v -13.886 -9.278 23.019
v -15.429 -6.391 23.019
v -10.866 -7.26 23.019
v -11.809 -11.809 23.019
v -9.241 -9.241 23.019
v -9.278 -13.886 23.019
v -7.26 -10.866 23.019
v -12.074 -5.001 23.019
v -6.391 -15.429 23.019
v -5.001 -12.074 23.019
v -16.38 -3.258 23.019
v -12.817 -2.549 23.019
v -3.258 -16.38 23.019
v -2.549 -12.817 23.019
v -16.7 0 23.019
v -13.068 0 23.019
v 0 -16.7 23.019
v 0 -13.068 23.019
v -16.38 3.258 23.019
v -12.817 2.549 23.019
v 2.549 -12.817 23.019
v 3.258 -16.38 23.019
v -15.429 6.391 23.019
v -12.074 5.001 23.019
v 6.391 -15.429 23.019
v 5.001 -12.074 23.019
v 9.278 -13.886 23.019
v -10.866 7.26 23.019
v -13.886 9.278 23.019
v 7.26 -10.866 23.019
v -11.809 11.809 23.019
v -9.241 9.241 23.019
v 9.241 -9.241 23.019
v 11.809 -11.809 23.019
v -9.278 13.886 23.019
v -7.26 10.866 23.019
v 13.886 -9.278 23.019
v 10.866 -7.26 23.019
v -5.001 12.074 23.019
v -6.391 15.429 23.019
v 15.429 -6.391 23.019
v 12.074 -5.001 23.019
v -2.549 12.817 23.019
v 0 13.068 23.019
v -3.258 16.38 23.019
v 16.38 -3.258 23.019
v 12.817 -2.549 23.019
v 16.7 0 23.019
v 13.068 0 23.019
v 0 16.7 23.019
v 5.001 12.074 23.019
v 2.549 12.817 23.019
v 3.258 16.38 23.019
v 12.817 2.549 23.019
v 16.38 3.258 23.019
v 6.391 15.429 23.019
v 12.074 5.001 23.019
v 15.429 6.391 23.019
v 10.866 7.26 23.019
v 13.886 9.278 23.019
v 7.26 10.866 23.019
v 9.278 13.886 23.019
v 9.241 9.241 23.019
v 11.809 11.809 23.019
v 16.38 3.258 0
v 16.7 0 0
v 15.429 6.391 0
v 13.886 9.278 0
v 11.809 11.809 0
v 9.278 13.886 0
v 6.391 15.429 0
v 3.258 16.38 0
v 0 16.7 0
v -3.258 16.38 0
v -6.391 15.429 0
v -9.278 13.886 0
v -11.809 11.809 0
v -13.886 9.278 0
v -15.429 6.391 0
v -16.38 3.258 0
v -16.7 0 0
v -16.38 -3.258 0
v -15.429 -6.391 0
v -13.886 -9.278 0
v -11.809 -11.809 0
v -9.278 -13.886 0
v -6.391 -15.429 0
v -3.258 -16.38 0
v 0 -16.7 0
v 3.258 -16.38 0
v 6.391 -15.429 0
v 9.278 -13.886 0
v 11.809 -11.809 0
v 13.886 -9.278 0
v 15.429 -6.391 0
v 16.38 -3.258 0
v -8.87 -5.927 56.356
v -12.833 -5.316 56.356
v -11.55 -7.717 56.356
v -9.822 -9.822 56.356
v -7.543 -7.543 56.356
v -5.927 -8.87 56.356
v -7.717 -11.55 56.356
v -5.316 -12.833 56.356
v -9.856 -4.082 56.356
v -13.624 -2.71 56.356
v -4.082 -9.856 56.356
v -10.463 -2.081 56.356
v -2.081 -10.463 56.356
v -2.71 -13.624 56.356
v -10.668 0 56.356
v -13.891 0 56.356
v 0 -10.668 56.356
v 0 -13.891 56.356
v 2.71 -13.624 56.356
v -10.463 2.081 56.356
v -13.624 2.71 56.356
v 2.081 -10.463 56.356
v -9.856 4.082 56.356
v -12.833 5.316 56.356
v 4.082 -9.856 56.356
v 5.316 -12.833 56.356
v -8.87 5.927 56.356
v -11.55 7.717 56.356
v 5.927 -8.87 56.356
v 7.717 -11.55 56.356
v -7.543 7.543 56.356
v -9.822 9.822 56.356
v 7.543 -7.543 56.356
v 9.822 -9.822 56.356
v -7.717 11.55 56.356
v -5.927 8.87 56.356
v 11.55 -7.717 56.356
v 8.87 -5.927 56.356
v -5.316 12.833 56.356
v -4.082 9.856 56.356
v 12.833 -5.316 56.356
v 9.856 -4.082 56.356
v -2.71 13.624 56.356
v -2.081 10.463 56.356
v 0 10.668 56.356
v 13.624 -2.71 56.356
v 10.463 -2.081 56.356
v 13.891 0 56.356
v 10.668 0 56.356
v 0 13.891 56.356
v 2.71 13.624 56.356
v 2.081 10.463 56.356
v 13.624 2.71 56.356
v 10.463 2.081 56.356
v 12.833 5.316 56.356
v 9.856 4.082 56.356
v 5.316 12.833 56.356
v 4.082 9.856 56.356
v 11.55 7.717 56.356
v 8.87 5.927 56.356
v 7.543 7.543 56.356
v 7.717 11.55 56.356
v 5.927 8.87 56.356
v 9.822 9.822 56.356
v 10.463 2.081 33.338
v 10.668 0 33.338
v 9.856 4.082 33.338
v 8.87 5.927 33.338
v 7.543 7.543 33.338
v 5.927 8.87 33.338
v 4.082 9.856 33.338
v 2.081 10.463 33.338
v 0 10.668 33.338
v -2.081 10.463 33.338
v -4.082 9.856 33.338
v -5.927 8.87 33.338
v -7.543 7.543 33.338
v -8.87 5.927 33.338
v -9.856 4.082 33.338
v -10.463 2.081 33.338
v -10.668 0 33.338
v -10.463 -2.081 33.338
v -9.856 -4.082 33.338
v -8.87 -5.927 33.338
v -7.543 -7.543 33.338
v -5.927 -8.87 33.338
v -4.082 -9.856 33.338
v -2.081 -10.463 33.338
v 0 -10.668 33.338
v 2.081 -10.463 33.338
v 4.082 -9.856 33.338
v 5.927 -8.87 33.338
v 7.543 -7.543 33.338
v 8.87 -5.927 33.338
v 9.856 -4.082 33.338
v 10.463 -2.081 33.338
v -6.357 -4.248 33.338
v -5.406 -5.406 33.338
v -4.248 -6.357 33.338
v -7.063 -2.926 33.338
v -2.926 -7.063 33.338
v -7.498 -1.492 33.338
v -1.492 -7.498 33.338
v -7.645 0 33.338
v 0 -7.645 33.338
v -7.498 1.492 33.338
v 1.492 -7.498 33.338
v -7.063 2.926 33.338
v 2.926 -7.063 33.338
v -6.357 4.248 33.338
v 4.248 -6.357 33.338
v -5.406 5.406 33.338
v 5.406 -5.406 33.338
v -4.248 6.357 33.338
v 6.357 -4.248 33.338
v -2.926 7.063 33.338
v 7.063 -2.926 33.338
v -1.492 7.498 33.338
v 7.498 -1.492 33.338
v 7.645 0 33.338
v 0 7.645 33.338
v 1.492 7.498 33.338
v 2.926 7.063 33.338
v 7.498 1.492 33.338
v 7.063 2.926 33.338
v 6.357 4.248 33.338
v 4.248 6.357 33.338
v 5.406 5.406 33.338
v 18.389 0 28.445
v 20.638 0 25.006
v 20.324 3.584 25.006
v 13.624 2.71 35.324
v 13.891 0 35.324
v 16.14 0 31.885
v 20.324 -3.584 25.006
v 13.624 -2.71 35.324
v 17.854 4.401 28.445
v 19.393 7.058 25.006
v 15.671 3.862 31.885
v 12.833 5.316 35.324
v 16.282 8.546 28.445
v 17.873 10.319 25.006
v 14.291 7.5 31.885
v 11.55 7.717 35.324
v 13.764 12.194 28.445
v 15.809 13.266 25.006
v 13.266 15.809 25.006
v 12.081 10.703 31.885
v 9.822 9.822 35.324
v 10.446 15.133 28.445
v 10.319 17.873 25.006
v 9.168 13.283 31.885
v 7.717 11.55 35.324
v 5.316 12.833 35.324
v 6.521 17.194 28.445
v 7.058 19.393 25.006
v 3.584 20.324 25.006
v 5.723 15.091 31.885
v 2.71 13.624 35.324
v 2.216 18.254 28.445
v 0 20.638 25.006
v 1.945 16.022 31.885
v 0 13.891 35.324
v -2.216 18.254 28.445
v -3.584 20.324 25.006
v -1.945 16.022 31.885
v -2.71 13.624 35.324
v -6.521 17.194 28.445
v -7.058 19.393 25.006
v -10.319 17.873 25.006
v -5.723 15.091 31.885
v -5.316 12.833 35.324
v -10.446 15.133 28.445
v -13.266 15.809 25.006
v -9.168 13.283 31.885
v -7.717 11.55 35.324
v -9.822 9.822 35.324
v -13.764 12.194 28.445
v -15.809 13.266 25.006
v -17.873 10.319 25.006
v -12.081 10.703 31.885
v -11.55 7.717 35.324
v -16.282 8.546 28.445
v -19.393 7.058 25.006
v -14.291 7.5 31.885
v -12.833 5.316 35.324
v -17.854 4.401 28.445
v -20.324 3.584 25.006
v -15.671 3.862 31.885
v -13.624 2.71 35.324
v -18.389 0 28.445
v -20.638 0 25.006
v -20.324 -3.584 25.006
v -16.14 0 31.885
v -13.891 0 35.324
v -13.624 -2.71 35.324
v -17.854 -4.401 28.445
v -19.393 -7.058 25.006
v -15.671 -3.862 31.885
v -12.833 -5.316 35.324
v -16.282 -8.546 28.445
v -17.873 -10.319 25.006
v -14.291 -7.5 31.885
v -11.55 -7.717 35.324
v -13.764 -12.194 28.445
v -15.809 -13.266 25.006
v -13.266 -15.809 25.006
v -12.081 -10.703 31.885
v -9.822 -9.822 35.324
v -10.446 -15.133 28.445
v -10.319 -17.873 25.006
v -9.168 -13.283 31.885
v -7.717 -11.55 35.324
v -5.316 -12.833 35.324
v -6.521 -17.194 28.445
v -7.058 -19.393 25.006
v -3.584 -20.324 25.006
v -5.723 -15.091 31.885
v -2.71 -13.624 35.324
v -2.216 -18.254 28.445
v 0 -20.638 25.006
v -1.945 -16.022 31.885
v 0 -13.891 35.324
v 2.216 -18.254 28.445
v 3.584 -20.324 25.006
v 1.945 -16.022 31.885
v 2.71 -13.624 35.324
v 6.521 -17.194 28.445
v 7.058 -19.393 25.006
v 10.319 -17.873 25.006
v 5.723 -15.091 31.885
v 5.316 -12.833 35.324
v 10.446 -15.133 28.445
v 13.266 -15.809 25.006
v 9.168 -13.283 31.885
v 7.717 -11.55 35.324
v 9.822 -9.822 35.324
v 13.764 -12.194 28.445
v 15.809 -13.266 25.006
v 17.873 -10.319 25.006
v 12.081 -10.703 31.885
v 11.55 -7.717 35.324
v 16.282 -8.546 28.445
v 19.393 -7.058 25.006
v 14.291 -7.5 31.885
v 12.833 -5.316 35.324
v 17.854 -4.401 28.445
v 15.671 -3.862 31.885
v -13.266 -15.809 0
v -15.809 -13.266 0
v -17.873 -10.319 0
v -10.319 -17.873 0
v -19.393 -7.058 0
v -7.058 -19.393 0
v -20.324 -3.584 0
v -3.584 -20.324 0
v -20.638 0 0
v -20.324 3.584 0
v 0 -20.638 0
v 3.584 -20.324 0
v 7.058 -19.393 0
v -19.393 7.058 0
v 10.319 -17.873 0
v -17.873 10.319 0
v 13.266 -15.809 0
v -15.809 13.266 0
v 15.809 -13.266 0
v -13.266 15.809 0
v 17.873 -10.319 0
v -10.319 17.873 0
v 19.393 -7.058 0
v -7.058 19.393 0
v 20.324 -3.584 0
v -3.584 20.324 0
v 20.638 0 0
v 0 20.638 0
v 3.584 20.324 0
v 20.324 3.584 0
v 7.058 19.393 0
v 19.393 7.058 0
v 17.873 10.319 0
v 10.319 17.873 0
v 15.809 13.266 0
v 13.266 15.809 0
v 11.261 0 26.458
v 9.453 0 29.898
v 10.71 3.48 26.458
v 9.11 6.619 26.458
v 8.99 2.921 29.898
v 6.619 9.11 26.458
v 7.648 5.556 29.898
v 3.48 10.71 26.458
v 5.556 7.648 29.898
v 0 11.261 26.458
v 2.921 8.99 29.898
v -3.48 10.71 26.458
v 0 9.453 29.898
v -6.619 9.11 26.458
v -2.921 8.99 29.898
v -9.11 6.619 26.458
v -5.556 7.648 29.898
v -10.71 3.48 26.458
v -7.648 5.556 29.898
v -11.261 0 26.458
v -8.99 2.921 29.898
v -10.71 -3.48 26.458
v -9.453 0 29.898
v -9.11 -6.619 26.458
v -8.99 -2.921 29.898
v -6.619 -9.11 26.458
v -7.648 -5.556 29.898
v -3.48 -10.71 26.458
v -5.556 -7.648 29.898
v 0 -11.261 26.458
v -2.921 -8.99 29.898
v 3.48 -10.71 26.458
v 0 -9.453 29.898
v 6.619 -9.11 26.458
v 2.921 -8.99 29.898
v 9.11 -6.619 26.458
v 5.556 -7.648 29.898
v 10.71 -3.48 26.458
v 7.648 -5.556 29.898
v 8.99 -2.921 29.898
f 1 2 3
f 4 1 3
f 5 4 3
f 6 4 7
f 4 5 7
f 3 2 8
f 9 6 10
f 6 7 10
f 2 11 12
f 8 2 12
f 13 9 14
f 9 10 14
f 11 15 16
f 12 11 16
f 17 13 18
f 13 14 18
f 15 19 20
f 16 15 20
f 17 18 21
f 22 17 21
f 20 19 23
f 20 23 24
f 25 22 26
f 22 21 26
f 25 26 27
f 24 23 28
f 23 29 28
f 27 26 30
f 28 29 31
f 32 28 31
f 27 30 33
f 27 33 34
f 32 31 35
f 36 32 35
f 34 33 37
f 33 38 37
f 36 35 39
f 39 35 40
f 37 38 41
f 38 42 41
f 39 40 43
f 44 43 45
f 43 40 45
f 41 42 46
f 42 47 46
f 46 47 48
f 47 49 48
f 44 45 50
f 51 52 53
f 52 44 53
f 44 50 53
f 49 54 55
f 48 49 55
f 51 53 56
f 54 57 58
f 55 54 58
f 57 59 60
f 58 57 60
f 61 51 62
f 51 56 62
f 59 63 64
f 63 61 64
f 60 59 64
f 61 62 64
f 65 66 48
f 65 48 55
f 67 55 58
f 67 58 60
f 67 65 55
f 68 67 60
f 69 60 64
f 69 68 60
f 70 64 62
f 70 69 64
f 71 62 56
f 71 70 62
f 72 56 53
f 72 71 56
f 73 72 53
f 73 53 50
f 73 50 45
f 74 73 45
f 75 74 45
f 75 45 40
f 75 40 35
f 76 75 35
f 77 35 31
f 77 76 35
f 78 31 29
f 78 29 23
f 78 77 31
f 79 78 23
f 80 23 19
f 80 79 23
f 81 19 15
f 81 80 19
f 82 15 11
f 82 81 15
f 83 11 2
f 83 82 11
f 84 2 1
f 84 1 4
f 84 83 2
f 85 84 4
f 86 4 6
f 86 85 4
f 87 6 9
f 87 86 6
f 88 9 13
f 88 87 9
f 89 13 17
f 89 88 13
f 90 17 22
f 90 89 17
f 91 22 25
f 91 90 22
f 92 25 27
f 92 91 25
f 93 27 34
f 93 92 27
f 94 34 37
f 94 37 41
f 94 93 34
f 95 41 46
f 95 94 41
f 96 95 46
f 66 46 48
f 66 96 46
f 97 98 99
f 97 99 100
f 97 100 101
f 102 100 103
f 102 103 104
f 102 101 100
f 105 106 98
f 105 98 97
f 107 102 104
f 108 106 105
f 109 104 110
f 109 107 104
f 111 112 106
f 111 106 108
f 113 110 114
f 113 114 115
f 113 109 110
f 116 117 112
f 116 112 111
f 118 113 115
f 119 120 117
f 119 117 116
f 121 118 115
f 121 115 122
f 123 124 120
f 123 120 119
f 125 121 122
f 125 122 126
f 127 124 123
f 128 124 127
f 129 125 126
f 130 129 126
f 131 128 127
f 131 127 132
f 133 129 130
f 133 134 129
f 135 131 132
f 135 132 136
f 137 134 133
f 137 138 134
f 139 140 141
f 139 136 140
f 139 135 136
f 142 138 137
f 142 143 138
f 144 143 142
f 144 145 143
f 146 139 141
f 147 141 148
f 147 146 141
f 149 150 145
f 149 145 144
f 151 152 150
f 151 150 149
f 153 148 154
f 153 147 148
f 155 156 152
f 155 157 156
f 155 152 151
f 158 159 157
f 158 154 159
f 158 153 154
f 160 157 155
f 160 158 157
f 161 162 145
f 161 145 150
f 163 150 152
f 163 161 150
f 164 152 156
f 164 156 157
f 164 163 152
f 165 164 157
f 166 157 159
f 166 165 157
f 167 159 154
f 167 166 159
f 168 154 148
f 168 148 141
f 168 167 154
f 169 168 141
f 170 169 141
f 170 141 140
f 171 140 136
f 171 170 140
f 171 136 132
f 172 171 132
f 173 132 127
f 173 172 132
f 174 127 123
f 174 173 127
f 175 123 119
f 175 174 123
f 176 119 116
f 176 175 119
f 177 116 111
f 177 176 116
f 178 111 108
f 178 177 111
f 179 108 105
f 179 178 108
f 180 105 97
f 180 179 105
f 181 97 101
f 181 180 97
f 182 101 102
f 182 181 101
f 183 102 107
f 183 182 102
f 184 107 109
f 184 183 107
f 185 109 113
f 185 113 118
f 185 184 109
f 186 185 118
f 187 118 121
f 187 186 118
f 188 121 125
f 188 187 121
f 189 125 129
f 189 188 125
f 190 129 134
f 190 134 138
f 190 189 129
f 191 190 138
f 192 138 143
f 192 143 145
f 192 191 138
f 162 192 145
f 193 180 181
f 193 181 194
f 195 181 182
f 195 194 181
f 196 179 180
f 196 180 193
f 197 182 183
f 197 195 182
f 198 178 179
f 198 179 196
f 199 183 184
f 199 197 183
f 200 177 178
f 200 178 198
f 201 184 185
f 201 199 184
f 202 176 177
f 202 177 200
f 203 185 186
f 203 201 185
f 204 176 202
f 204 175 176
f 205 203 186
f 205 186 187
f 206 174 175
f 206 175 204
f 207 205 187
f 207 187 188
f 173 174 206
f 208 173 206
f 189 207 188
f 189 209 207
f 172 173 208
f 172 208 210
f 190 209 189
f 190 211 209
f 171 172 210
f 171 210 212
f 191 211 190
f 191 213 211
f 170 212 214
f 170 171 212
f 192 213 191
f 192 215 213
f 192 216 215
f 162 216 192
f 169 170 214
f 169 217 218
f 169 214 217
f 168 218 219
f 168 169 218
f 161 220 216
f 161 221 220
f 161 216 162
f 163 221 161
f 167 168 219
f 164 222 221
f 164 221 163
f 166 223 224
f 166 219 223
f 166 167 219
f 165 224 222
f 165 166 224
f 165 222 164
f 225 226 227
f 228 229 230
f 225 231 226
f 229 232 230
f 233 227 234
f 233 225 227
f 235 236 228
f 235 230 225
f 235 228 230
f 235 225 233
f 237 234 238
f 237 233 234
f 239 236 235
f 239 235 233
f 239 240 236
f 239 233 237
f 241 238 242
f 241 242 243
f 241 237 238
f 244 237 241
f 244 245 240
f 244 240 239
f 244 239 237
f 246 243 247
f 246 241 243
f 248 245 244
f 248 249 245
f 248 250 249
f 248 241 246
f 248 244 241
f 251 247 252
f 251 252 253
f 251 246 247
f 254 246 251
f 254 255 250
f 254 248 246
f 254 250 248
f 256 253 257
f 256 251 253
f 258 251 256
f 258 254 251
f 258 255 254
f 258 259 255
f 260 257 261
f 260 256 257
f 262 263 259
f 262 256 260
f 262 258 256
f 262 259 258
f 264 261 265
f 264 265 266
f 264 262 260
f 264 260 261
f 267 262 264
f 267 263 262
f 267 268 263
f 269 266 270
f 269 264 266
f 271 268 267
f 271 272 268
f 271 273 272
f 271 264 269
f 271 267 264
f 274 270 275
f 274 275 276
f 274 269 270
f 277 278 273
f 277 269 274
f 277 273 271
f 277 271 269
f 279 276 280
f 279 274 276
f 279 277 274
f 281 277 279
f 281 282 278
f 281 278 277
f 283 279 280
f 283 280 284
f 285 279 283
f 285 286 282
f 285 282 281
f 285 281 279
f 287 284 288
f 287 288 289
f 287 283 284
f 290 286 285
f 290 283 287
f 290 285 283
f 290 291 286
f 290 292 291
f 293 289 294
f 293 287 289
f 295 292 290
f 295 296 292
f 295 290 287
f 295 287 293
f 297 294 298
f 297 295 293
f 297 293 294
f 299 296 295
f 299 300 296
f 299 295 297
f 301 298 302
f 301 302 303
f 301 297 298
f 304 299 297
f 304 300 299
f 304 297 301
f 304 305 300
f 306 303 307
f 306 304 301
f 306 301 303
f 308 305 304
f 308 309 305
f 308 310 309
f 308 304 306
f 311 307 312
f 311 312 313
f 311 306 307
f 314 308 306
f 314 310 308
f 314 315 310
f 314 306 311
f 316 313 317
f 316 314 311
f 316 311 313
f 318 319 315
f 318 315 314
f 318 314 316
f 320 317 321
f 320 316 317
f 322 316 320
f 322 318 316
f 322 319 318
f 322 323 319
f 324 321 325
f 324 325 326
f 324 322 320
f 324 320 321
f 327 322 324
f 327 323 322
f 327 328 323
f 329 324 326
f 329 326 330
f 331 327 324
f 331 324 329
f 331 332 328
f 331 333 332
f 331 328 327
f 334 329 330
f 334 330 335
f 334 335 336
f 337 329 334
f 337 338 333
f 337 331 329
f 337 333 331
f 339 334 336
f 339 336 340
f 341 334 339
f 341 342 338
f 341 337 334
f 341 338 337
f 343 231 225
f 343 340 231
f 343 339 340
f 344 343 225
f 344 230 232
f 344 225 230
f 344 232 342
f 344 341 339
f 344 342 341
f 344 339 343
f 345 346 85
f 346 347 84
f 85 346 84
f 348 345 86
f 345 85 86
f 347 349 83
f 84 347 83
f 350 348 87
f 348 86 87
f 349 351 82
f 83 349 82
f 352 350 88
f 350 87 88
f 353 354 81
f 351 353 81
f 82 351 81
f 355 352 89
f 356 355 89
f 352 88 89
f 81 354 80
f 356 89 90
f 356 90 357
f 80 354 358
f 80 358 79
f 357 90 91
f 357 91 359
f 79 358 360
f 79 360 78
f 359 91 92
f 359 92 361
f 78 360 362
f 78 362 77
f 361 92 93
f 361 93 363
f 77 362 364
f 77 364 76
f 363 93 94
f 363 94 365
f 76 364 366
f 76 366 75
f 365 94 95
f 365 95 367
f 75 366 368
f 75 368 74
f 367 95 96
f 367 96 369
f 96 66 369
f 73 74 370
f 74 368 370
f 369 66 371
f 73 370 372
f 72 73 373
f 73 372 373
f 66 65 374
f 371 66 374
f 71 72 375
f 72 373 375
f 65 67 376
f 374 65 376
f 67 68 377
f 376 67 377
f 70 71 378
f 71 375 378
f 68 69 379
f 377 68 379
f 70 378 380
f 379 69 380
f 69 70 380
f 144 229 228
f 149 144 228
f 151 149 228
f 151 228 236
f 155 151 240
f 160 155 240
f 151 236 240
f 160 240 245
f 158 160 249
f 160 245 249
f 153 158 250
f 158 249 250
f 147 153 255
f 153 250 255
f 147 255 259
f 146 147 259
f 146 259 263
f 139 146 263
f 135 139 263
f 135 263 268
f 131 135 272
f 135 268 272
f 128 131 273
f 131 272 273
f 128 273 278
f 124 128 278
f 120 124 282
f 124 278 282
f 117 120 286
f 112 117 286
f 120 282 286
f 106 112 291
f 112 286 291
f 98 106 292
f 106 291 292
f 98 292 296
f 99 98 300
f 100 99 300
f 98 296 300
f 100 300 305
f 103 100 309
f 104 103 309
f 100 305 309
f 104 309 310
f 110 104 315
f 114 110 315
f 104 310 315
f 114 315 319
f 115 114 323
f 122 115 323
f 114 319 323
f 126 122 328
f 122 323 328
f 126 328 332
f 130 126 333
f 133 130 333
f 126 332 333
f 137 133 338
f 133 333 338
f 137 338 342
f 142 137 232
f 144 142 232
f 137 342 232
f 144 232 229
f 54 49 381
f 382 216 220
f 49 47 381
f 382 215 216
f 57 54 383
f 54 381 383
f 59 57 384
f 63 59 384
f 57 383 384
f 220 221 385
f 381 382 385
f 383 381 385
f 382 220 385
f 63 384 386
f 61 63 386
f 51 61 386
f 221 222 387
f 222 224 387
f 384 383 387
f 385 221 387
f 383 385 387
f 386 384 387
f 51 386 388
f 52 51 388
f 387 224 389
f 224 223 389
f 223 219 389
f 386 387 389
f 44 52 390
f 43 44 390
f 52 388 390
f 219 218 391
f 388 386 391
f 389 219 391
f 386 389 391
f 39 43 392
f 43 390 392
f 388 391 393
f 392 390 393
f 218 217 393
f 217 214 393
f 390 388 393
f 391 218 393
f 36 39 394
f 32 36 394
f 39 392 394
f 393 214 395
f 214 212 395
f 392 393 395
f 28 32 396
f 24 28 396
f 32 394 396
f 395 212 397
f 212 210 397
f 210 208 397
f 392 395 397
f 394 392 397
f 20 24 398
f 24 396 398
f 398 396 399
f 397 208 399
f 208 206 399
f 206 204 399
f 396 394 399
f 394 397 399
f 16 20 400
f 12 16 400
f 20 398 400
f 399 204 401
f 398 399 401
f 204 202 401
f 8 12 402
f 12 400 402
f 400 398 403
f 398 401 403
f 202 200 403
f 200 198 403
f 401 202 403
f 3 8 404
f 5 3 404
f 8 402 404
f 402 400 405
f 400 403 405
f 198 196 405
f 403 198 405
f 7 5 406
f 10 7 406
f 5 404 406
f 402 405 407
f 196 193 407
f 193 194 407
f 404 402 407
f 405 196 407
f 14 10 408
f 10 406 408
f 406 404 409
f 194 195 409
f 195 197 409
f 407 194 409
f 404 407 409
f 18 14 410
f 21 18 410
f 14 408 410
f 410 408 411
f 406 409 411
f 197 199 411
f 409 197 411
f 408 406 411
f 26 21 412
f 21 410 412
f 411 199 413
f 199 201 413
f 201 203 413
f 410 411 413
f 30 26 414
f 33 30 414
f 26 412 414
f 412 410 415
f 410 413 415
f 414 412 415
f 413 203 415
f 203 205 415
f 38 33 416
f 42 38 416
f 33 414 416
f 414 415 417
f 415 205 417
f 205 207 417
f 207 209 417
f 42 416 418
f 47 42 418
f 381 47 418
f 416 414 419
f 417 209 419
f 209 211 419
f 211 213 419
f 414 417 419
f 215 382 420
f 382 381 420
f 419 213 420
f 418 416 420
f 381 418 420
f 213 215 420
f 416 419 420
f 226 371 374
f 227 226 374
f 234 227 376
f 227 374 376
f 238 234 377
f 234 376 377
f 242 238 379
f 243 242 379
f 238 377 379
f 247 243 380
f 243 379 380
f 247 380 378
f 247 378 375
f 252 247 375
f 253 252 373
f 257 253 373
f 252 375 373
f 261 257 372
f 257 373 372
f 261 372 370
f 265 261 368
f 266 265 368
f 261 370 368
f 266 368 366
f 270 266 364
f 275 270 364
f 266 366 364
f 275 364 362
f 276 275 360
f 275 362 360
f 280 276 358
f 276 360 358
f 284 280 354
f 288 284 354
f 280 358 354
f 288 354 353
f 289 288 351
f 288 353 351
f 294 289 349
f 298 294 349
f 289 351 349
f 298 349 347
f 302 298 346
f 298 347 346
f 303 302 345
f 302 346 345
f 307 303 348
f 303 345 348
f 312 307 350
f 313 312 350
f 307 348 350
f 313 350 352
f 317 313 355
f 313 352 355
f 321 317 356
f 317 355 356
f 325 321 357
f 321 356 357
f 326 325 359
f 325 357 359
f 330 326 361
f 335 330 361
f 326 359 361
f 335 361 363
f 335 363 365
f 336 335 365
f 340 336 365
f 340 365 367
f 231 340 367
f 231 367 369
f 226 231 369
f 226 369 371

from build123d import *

# Parameters (mm, degrees)
CYLINDER2I_R     = 10.668
CYLINDER2I_DEPTH = 23.01875
CYLINDER1I_R     = 16.7005
CYLINDER1I_DEPTH = 23.01875
CYLINDER2_R      = 13.890625
CYLINDER2_DEPTH  = 21.03176
CYLINDER1_R      = 20.6375
CYLINDER1_DEPTH  = 25.00574


with BuildPart() as cone001:
    # Cone001 → Cone001 (revolve)
    with BuildSketch(Plane(origin=(0, 0, 23.01875), x_dir=(1, 0, 0), z_dir=(0, -1, 0))):
        Polygon((0, 0), (13.0683, 0), (7.6454, 10.31875), (0, 10.31875), align=None)
    revolve(axis=Axis((0, 0, 23.01875), (0, 0, 1)))


with BuildPart() as cylinder2i:
    # Cylinder2i → Cylinder2i (new body)
    with BuildSketch(Plane.XY.offset(33.3375)):
        Circle(CYLINDER2I_R)
    extrude(amount=CYLINDER2I_DEPTH)


with BuildPart() as innerparts:
    # Cylinder1i → Cylinder1i (new body)
    with BuildSketch(Plane.XY):
        Circle(CYLINDER1I_R)
    extrude(amount=CYLINDER1I_DEPTH)

    # InnerParts: union Cone001, Cylinder2i
    add(cone001.part)
    add(cylinder2i.part)


with BuildPart() as cone:
    # Cone → Cone (revolve)
    with BuildSketch(Plane(origin=(0, 0, 25.00574), x_dir=(1, 0, 0), z_dir=(0, -1, 0))):
        Polygon((0, 0), (20.6375, 0), (13.890625, 10.31875), (0, 10.31875), align=None)
    revolve(axis=Axis((0, 0, 25.00574), (0, 0, 1)))


with BuildPart() as cylinder2:
    # Cylinder2 → Cylinder2 (new body)
    with BuildSketch(Plane.XY.offset(35.32449)):
        Circle(CYLINDER2_R)
    extrude(amount=CYLINDER2_DEPTH)


with BuildPart() as coupling:
    # Cylinder1 → Cylinder1 (new body)
    with BuildSketch(Plane.XY):
        Circle(CYLINDER1_R)
    extrude(amount=CYLINDER1_DEPTH)

    # OuterParts: union Cone, Cylinder2
    add(cone.part)
    add(cylinder2.part)

    # coupling: cut InnerParts
    add(innerparts.part, mode=Mode.SUBTRACT)


solid = coupling.part
